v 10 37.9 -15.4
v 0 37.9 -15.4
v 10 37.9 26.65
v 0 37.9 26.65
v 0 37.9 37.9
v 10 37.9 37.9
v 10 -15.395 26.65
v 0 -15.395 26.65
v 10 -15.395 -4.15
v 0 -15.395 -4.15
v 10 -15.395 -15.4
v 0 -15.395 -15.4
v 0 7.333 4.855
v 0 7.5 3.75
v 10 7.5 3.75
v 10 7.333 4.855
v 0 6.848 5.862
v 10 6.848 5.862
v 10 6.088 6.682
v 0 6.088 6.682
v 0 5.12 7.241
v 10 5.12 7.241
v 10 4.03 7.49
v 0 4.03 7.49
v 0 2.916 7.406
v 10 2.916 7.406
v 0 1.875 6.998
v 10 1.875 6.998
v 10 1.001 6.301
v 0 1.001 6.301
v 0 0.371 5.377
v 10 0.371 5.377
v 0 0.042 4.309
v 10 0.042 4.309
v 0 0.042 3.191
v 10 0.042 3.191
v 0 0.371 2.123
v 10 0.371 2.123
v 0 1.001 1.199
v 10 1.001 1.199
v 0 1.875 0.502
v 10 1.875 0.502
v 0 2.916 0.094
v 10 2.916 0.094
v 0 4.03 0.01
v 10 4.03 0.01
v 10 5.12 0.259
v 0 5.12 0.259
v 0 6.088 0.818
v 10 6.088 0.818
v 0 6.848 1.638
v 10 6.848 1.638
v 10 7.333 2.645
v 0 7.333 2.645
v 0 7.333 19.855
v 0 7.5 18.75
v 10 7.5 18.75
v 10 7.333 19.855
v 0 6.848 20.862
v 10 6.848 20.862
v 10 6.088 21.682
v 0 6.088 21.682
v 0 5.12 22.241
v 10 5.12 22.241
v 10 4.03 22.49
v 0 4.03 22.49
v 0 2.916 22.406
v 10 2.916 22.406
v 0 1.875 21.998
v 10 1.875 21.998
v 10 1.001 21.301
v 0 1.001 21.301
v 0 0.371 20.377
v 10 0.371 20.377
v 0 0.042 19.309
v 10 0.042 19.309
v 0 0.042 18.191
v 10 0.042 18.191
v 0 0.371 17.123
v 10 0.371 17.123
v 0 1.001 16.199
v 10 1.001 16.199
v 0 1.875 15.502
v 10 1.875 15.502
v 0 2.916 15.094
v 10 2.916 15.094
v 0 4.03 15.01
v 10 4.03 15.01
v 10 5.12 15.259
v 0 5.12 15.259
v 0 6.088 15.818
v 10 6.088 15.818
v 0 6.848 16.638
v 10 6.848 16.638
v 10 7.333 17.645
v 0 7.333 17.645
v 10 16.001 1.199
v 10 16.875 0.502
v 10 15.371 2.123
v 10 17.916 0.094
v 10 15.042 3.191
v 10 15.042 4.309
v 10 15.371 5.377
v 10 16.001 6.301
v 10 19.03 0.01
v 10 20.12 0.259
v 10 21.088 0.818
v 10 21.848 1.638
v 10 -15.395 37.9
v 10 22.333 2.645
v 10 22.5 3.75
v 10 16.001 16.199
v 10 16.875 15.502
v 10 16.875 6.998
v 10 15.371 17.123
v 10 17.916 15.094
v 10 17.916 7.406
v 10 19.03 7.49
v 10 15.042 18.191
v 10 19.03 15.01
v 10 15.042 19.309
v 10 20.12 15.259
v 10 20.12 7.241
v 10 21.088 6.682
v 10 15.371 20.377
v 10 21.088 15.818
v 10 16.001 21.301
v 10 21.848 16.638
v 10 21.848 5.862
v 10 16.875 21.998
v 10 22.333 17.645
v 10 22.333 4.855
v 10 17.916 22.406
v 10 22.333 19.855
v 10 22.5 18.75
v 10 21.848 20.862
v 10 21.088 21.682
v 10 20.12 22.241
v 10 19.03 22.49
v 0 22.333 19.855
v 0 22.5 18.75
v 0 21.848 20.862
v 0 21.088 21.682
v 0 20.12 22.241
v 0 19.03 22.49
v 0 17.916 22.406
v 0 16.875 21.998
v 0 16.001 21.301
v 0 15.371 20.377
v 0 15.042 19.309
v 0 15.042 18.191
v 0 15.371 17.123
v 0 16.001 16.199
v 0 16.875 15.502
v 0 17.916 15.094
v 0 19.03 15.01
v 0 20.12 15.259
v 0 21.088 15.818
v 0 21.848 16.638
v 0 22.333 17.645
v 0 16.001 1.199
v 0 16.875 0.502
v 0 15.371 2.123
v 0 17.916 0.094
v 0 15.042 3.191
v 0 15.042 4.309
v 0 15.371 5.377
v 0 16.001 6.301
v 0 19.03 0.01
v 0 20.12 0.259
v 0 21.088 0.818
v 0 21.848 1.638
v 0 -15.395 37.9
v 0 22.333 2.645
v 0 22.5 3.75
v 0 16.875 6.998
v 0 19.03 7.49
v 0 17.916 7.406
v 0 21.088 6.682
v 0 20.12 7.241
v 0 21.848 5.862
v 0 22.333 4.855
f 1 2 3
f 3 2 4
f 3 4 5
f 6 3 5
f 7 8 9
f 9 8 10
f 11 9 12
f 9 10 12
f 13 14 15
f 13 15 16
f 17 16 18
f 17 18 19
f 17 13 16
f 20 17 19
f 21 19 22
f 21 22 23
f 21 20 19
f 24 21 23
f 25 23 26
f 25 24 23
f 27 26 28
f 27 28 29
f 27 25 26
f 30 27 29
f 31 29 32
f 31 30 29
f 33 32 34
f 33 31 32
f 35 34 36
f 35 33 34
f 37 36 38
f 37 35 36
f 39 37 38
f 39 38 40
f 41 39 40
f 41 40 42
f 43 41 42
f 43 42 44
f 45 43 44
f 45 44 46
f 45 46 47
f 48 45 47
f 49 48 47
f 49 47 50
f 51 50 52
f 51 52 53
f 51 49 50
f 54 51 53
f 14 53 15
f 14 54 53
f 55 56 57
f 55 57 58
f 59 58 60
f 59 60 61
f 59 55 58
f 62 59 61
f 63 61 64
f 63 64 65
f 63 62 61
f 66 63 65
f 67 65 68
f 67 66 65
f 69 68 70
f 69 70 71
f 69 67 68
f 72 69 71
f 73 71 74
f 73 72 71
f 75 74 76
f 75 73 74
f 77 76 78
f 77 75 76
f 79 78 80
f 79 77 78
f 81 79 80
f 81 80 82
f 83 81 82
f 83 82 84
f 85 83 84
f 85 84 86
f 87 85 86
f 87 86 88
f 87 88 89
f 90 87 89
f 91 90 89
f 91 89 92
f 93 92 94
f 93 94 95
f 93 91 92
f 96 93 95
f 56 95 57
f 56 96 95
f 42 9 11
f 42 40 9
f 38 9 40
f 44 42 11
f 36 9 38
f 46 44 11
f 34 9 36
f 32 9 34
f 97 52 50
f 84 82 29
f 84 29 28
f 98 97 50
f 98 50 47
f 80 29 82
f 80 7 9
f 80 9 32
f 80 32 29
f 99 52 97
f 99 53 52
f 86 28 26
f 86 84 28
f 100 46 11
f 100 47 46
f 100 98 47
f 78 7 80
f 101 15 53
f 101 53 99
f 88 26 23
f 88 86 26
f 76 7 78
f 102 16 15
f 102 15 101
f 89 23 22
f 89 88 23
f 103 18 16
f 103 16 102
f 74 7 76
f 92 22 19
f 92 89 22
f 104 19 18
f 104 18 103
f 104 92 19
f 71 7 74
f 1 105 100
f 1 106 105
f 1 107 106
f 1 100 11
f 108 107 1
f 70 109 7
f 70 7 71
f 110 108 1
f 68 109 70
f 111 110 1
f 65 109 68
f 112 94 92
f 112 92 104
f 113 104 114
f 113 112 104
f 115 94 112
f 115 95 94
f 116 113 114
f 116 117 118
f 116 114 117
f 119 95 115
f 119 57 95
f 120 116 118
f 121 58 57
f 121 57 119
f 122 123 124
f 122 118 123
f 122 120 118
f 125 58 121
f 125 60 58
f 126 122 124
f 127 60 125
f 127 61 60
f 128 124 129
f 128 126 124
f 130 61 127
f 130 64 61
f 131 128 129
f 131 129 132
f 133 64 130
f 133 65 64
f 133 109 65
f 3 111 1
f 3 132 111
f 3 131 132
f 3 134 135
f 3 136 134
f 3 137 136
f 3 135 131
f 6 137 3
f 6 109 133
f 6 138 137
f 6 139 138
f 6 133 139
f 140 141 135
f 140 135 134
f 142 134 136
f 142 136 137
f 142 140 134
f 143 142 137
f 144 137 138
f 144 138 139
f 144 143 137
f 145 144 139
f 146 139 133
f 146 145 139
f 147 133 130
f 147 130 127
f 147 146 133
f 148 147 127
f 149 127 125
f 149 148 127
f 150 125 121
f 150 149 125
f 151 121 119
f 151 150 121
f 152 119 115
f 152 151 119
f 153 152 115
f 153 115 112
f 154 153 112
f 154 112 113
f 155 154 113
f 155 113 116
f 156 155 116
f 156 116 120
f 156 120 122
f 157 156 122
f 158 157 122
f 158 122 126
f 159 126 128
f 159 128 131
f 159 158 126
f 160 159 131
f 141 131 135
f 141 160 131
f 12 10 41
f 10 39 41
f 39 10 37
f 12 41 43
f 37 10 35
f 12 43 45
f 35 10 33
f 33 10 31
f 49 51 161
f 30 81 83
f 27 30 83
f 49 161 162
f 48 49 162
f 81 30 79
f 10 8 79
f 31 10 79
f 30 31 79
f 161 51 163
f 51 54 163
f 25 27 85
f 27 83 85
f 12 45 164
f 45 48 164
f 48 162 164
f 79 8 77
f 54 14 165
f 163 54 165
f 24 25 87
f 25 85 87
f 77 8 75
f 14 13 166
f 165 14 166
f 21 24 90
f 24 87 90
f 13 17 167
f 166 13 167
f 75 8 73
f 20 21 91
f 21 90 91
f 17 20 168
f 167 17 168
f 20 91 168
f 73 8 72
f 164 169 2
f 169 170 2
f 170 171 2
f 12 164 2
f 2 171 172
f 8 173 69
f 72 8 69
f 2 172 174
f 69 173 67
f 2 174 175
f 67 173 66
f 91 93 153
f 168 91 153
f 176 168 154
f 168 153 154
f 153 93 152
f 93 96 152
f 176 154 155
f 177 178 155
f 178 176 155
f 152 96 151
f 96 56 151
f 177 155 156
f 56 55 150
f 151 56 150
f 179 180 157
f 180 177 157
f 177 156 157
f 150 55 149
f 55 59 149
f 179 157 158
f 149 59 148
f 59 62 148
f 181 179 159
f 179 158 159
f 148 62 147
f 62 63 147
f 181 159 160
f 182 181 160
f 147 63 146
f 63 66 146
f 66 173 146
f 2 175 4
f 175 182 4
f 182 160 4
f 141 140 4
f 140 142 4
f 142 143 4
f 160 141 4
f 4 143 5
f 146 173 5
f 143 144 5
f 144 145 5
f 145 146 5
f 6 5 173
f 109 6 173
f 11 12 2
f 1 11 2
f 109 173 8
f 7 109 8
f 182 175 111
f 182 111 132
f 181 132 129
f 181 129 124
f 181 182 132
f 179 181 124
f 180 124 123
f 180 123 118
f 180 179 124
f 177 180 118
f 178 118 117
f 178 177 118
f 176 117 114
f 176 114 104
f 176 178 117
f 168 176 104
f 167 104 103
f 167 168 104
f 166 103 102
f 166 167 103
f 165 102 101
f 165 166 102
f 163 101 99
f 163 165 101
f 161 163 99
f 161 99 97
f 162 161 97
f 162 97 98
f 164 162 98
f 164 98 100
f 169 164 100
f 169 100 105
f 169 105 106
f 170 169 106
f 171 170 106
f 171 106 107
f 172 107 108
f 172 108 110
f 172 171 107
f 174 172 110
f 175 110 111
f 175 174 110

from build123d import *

# Parameters (mm, degrees)
F0_R     = 3.75
F0_W     = 11.25
F0_H     = 30.8000000767
F0_W_2   = 11.2448162399
F0_H_2   = 30.8000003636
F1_DEPTH = 10


# Not quite as in the source:
# - ends of sketch curves that miss each other by under 0.0002 mm in the source are joined


with BuildPart() as f1:
    # F0 (on Right) → F1 (new body)
    with BuildSketch(Plane.YZ):
        Polygon((11.25, 26.6500003636), (-4.1499999352, 26.6500003636), (-4.1499999352, -4.15), (11.25, -4.15), (26.65, -4.15), (26.65, 26.65), align=None)
        with Locations((3.75, 3.75)):
            Circle(F0_R, mode=Mode.SUBTRACT)
        with Locations((18.75, 3.75)):
            Circle(F0_R, mode=Mode.SUBTRACT)
        with Locations((3.75, 18.75)):
            Circle(F0_R, mode=Mode.SUBTRACT)
        with Locations((18.75, 18.75)):
            Circle(F0_R, mode=Mode.SUBTRACT)
        with Locations((32.275, 11.2500000384)):
            Rectangle(F0_W, F0_H)
        Polygon((11.25, -4.15), (-4.1499999352, -4.15), (-15.3948161751, -4.15), (-15.3948161751, -15.4), (-4.1499999352, -15.4), (26.65, -15.4), (37.9, -15.4), (37.9, -4.15), (26.65, -4.15), align=None)
        Polygon((-15.3948161751, 26.6500003636), (-4.1499999352, 26.6500002869), (11.25, 26.6500003636), (26.65, 26.65), (37.9, 26.65), (37.9000000767, 37.9), (-15.3948160984, 37.9000003636), align=None)
        with Locations((-9.7724080551, 11.2500001818)):
            Rectangle(F0_W_2, F0_H_2)
    extrude(amount=F1_DEPTH)


solid = f1.part
